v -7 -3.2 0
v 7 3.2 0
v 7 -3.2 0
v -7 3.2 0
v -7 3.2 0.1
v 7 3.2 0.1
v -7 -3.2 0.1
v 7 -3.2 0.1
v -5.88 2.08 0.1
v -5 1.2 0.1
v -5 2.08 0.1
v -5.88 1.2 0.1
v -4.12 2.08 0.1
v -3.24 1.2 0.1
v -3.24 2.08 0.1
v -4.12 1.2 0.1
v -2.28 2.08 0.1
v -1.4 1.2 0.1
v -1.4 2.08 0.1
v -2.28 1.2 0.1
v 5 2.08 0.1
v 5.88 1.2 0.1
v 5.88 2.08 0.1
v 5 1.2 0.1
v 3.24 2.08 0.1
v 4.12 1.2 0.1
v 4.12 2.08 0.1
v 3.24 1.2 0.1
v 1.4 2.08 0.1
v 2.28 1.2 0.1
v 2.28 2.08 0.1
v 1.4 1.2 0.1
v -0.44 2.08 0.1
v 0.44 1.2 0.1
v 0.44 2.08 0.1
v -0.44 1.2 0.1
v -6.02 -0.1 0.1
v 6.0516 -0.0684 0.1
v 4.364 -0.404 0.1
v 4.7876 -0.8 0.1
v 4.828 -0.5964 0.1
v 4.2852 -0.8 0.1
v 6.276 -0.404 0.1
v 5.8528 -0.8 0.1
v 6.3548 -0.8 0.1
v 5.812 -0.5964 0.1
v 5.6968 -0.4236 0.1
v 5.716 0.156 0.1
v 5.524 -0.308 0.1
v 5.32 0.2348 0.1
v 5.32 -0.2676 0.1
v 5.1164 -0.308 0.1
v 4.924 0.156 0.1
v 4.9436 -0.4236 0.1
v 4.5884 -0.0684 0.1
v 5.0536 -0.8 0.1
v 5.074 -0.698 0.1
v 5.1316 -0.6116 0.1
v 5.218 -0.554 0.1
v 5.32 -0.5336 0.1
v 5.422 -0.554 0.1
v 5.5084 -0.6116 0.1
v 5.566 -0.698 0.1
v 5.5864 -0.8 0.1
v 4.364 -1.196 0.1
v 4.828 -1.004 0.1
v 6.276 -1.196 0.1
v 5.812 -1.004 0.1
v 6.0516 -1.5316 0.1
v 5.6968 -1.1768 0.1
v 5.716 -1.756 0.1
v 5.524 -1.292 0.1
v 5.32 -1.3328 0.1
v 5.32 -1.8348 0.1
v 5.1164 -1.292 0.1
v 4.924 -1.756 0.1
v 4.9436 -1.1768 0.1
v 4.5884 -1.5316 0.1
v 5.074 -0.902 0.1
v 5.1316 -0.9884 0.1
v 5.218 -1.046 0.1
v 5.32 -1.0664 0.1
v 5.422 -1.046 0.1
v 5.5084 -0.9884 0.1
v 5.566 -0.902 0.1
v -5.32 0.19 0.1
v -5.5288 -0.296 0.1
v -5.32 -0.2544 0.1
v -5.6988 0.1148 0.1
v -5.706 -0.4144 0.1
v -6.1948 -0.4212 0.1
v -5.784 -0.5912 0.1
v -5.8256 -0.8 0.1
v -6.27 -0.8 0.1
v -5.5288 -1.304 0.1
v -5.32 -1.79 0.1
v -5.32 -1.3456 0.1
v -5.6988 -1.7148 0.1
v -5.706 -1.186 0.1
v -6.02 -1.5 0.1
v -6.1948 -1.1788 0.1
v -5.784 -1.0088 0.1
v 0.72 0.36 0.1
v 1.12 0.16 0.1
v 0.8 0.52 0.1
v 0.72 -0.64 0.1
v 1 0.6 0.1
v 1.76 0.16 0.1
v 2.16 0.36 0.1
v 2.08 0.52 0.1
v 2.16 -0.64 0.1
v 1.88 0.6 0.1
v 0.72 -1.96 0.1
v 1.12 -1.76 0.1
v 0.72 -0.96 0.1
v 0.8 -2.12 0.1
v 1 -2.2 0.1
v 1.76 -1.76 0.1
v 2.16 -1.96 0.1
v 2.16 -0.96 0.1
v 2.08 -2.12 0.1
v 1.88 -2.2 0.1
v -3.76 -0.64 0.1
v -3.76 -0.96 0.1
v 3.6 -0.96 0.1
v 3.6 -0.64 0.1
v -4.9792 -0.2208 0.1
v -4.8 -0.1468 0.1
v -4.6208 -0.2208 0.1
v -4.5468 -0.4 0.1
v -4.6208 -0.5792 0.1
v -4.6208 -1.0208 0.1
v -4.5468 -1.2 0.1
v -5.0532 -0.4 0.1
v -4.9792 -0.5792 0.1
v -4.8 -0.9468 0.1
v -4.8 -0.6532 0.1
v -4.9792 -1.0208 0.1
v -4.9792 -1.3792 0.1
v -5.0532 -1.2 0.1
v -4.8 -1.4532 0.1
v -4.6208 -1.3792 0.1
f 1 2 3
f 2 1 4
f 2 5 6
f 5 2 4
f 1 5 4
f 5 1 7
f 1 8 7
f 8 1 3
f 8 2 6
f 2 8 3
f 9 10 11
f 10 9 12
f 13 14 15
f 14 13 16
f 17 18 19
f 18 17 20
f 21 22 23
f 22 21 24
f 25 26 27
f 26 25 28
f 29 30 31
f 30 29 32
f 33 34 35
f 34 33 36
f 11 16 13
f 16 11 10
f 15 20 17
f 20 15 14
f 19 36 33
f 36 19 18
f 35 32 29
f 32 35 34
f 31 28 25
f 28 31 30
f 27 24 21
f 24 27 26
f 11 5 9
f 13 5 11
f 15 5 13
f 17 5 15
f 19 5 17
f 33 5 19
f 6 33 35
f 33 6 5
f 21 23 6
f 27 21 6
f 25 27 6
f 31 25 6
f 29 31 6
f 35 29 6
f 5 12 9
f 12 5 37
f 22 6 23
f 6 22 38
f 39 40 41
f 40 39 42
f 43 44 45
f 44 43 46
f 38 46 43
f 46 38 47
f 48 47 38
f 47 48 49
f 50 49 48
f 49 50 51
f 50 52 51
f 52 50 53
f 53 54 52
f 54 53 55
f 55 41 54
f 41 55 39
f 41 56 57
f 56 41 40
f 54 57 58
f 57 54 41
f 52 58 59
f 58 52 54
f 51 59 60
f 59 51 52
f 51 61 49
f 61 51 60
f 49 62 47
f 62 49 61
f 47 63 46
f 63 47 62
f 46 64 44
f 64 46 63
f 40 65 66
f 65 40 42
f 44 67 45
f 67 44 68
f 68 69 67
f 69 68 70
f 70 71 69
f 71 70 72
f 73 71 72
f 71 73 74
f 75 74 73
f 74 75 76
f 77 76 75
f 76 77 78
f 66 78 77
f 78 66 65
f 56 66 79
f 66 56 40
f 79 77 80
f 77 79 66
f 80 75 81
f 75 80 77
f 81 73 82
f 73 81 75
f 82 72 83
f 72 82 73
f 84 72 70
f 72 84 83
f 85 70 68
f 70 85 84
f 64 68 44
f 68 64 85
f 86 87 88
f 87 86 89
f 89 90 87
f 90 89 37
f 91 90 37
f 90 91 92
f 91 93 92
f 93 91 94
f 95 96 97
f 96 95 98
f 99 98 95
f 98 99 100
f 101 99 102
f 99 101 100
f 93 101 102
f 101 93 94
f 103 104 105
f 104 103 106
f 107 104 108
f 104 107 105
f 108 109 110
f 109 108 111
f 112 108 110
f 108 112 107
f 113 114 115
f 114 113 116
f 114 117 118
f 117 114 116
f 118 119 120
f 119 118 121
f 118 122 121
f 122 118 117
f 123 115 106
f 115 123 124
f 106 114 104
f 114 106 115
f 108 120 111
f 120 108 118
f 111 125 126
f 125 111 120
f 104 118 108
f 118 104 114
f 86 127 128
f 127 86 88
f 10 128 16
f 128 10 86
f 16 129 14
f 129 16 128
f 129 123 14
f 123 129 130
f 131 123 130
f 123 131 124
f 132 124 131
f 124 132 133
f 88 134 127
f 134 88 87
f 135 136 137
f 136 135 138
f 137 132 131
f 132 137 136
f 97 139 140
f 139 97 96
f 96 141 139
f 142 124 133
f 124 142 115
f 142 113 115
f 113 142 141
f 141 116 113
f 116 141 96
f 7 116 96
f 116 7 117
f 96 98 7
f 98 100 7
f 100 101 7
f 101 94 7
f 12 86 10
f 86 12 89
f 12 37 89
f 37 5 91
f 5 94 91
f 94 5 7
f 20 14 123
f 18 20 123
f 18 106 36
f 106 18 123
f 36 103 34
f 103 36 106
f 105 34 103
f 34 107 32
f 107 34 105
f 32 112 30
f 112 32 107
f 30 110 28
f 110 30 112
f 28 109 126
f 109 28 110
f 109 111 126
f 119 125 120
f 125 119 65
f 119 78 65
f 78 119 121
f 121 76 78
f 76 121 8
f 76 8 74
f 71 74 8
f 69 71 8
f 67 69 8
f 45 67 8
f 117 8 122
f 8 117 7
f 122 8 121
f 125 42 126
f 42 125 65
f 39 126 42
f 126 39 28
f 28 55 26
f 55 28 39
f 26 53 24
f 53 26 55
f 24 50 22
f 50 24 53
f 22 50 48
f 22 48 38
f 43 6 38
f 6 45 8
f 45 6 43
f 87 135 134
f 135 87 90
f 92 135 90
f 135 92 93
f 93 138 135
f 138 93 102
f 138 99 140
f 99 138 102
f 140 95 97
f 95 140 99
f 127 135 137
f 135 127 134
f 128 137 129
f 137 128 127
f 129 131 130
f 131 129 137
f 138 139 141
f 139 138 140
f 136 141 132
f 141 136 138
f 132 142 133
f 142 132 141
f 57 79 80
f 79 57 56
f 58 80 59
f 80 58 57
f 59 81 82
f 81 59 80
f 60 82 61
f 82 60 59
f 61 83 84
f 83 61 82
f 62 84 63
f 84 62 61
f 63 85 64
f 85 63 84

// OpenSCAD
// file: ../p/box5-12.scad
use <../lib.scad>
function ldraw_lib__box5_12() = [
// 0 Box with 5 Faces without Any Edges
// 0 Name: box5-12.dat
// 0 Author: Chris Dee [cwdee]
// 0 !LDRAW_ORG Primitive UPDATE 2009-02
// 0 !LICENSE Licensed under CC BY 2.0 and CC BY 4.0 : see CAreadme.txt
// 
// 0 BFC CERTIFY CCW
  [0,"BFC","CERTIFY"],
  [0,"BFC","CCW"],
// 
// 0 !HISTORY 2009-09-03 [PTadmin] Official Update 2009-02
// 
// 
// 4 16 1 1 1 1 1 -1 -1 1 -1 -1 1 1
  [4,16,1,1,1,1,1,-1,-1,1,-1,-1,1,1],
// 4 16 -1 0 1 1 0 1 1 1 1 -1 1 1
  [4,16,-1,0,1,1,0,1,1,1,1,-1,1,1],
// 4 16 -1 0 -1 -1 0 1 -1 1 1 -1 1 -1
  [4,16,-1,0,-1,-1,0,1,-1,1,1,-1,1,-1],
// 4 16 1 0 -1 -1 0 -1 -1 1 -1 1 1 -1
  [4,16,1,0,-1,-1,0,-1,-1,1,-1,1,1,-1],
// 4 16 1 0 1 1 0 -1 1 1 -1 1 1 1
  [4,16,1,0,1,1,0,-1,1,1,-1,1,1,1],
// 0
];
module ldraw_lib__box5_12(step=0, col=false, unit=2/5, alt=false, line=0.2, solid=!$preview)
    makepoly(ldraw_lib__box5_12(), step=step, col=col, unit=unit, alt=alt, line=line, solid=solid);
ldraw_lib__box5_12(line=0.2);
// main file
use <../lib.scad>
use <../p/box5-12.scad>
function ldraw_lib__6259759a() = [
// 0 Sticker  0.8 x  1.7 with Dark Turquoise and Magenta Buttons and Slider
// 0 Name: 6259759a.dat
// 0 Author: Evert-Jan Boer [ejboer]
// 0 !LDRAW_ORG Part UPDATE 2022-01
// 0 !LICENSE Licensed under CC BY 2.0 and CC BY 4.0 : see CAreadme.txt
// 
// 0 BFC CERTIFY CCW
  [0,"BFC","CERTIFY"],
  [0,"BFC","CCW"],
// 
// 0 !KEYWORDS Pop-Up Party Bus, Set 70828
// 
// 0 !HISTORY 2022-01-14 [PTadmin] Official Update 2022-01
// 
// 
// 1 16 0 -0.25 0 17.5 0 0 0 0.25 0 0 0 8 box5-12.dat
  [1,16,0,-0.25,0,17.5,0,0,0,0.25,0,0,0,8, ldraw_lib__box5_12()],
// 
// 4 3 -12.5 -0.25 5.2 -14.7 -0.25 5.2 -14.7 -0.25 3 -12.5 -0.25 3
  [4,3,-12.5,-0.25,5.2,-14.7,-0.25,5.2,-14.7,-0.25,3,-12.5,-0.25,3],
// 4 26 -8.1 -0.25 5.2 -10.3 -0.25 5.2 -10.3 -0.25 3 -8.1 -0.25 3
  [4,26,-8.1,-0.25,5.2,-10.3,-0.25,5.2,-10.3,-0.25,3,-8.1,-0.25,3],
// 4 3 -3.5 -0.25 5.2 -5.7 -0.25 5.2 -5.7 -0.25 3 -3.5 -0.25 3
  [4,3,-3.5,-0.25,5.2,-5.7,-0.25,5.2,-5.7,-0.25,3,-3.5,-0.25,3],
// 4 3 14.7 -0.25 3 14.7 -0.25 5.2 12.5 -0.25 5.2 12.5 -0.25 3
  [4,3,14.7,-0.25,3,14.7,-0.25,5.2,12.5,-0.25,5.2,12.5,-0.25,3],
// 4 26 10.3 -0.25 3 10.3 -0.25 5.2 8.1 -0.25 5.2 8.1 -0.25 3
  [4,26,10.3,-0.25,3,10.3,-0.25,5.2,8.1,-0.25,5.2,8.1,-0.25,3],
// 4 3 5.7 -0.25 3 5.7 -0.25 5.2 3.5 -0.25 5.2 3.5 -0.25 3
  [4,3,5.7,-0.25,3,5.7,-0.25,5.2,3.5,-0.25,5.2,3.5,-0.25,3],
// 4 26 1.1 -0.25 5.2 -1.1 -0.25 5.2 -1.1 -0.25 3 1.1 -0.25 3
  [4,26,1.1,-0.25,5.2,-1.1,-0.25,5.2,-1.1,-0.25,3,1.1,-0.25,3],
// 4 0 -10.3 -0.25 5.2 -12.5 -0.25 5.2 -12.5 -0.25 3 -10.3 -0.25 3
  [4,0,-10.3,-0.25,5.2,-12.5,-0.25,5.2,-12.5,-0.25,3,-10.3,-0.25,3],
// 4 0 -5.7 -0.25 5.2 -8.1 -0.25 5.2 -8.1 -0.25 3 -5.7 -0.25 3
  [4,0,-5.7,-0.25,5.2,-8.1,-0.25,5.2,-8.1,-0.25,3,-5.7,-0.25,3],
// 4 0 -1.1 -0.25 5.2 -3.5 -0.25 5.2 -3.5 -0.25 3 -1.1 -0.25 3
  [4,0,-1.1,-0.25,5.2,-3.5,-0.25,5.2,-3.5,-0.25,3,-1.1,-0.25,3],
// 4 0 3.5 -0.25 5.2 1.1 -0.25 5.2 1.1 -0.25 3 3.5 -0.25 3
  [4,0,3.5,-0.25,5.2,1.1,-0.25,5.2,1.1,-0.25,3,3.5,-0.25,3],
// 4 0 8.1 -0.25 5.2 5.7 -0.25 5.2 5.7 -0.25 3 8.1 -0.25 3
  [4,0,8.1,-0.25,5.2,5.7,-0.25,5.2,5.7,-0.25,3,8.1,-0.25,3],
// 4 0 12.5 -0.25 5.2 10.3 -0.25 5.2 10.3 -0.25 3 12.5 -0.25 3
  [4,0,12.5,-0.25,5.2,10.3,-0.25,5.2,10.3,-0.25,3,12.5,-0.25,3],
// 3 0 -12.5 -0.25 5.2 -17.5 -0.25 8 -14.7 -0.25 5.2
  [3,0,-12.5,-0.25,5.2,-17.5,-0.25,8,-14.7,-0.25,5.2],
// 3 0 -10.3 -0.25 5.2 -17.5 -0.25 8 -12.5 -0.25 5.2
  [3,0,-10.3,-0.25,5.2,-17.5,-0.25,8,-12.5,-0.25,5.2],
// 3 0 -8.1 -0.25 5.2 -17.5 -0.25 8 -10.3 -0.25 5.2
  [3,0,-8.1,-0.25,5.2,-17.5,-0.25,8,-10.3,-0.25,5.2],
// 3 0 -5.7 -0.25 5.2 -17.5 -0.25 8 -8.1 -0.25 5.2
  [3,0,-5.7,-0.25,5.2,-17.5,-0.25,8,-8.1,-0.25,5.2],
// 3 0 -3.5 -0.25 5.2 -17.5 -0.25 8 -5.7 -0.25 5.2
  [3,0,-3.5,-0.25,5.2,-17.5,-0.25,8,-5.7,-0.25,5.2],
// 3 0 -1.1 -0.25 5.2 -17.5 -0.25 8 -3.5 -0.25 5.2
  [3,0,-1.1,-0.25,5.2,-17.5,-0.25,8,-3.5,-0.25,5.2],
// 4 0 -17.5 -0.25 8 -1.1 -0.25 5.2 1.1 -0.25 5.2 17.5 -0.25 8
  [4,0,-17.5,-0.25,8,-1.1,-0.25,5.2,1.1,-0.25,5.2,17.5,-0.25,8],
// 3 0 12.5 -0.25 5.2 14.7 -0.25 5.2 17.5 -0.25 8
  [3,0,12.5,-0.25,5.2,14.7,-0.25,5.2,17.5,-0.25,8],
// 3 0 10.3 -0.25 5.2 12.5 -0.25 5.2 17.5 -0.25 8
  [3,0,10.3,-0.25,5.2,12.5,-0.25,5.2,17.5,-0.25,8],
// 3 0 8.1 -0.25 5.2 10.3 -0.25 5.2 17.5 -0.25 8
  [3,0,8.1,-0.25,5.2,10.3,-0.25,5.2,17.5,-0.25,8],
// 3 0 5.7 -0.25 5.2 8.1 -0.25 5.2 17.5 -0.25 8
  [3,0,5.7,-0.25,5.2,8.1,-0.25,5.2,17.5,-0.25,8],
// 3 0 3.5 -0.25 5.2 5.7 -0.25 5.2 17.5 -0.25 8
  [3,0,3.5,-0.25,5.2,5.7,-0.25,5.2,17.5,-0.25,8],
// 3 0 1.1 -0.25 5.2 3.5 -0.25 5.2 17.5 -0.25 8
  [3,0,1.1,-0.25,5.2,3.5,-0.25,5.2,17.5,-0.25,8],
// 4 0 -14.7 -0.25 3 -14.7 -0.25 5.2 -17.5 -0.25 8 -15.05 -0.25 -0.25
  [4,0,-14.7,-0.25,3,-14.7,-0.25,5.2,-17.5,-0.25,8,-15.05,-0.25,-0.25],
// 4 0 17.5 -0.25 8 14.7 -0.25 5.2 14.7 -0.25 3 15.129 -0.25 -0.171
  [4,0,17.5,-0.25,8,14.7,-0.25,5.2,14.7,-0.25,3,15.129,-0.25,-0.171],
// 4 15 11.969 -0.25 -2 12.07 -0.25 -1.491 10.91 -0.25 -1.01 10.713 -0.25 -2
  [4,15,11.969,-0.25,-2,12.07,-0.25,-1.491,10.91,-0.25,-1.01,10.713,-0.25,-2],
// 4 15 14.53 -0.25 -1.491 14.632 -0.25 -2 15.887 -0.25 -2 15.69 -0.25 -1.01
  [4,15,14.53,-0.25,-1.491,14.632,-0.25,-2,15.887,-0.25,-2,15.69,-0.25,-1.01],
// 4 15 14.242 -0.25 -1.059 14.53 -0.25 -1.491 15.69 -0.25 -1.01 15.129 -0.25 -0.171
  [4,15,14.242,-0.25,-1.059,14.53,-0.25,-1.491,15.69,-0.25,-1.01,15.129,-0.25,-0.171],
// 4 15 13.81 -0.25 -0.77 14.242 -0.25 -1.059 15.129 -0.25 -0.171 14.29 -0.25 0.39
  [4,15,13.81,-0.25,-0.77,14.242,-0.25,-1.059,15.129,-0.25,-0.171,14.29,-0.25,0.39],
// 4 15 13.3 -0.25 -0.669 13.81 -0.25 -0.77 14.29 -0.25 0.39 13.3 -0.25 0.587
  [4,15,13.3,-0.25,-0.669,13.81,-0.25,-0.77,14.29,-0.25,0.39,13.3,-0.25,0.587],
// 4 15 12.791 -0.25 -0.77 13.3 -0.25 -0.669 13.3 -0.25 0.587 12.31 -0.25 0.39
  [4,15,12.791,-0.25,-0.77,13.3,-0.25,-0.669,13.3,-0.25,0.587,12.31,-0.25,0.39],
// 4 15 12.359 -0.25 -1.059 12.791 -0.25 -0.77 12.31 -0.25 0.39 11.471 -0.25 -0.171
  [4,15,12.359,-0.25,-1.059,12.791,-0.25,-0.77,12.31,-0.25,0.39,11.471,-0.25,-0.171],
// 4 15 12.07 -0.25 -1.491 12.359 -0.25 -1.059 11.471 -0.25 -0.171 10.91 -0.25 -1.01
  [4,15,12.07,-0.25,-1.491,12.359,-0.25,-1.059,11.471,-0.25,-0.171,10.91,-0.25,-1.01],
// 4 0 12.07 -0.25 -1.491 11.969 -0.25 -2 12.634 -0.25 -2 12.685 -0.25 -1.745
  [4,0,12.07,-0.25,-1.491,11.969,-0.25,-2,12.634,-0.25,-2,12.685,-0.25,-1.745],
// 4 0 12.359 -0.25 -1.059 12.07 -0.25 -1.491 12.685 -0.25 -1.745 12.829 -0.25 -1.529
  [4,0,12.359,-0.25,-1.059,12.07,-0.25,-1.491,12.685,-0.25,-1.745,12.829,-0.25,-1.529],
// 4 0 12.791 -0.25 -0.77 12.359 -0.25 -1.059 12.829 -0.25 -1.529 13.045 -0.25 -1.385
  [4,0,12.791,-0.25,-0.77,12.359,-0.25,-1.059,12.829,-0.25,-1.529,13.045,-0.25,-1.385],
// 4 0 13.3 -0.25 -0.669 12.791 -0.25 -0.77 13.045 -0.25 -1.385 13.3 -0.25 -1.334
  [4,0,13.3,-0.25,-0.669,12.791,-0.25,-0.77,13.045,-0.25,-1.385,13.3,-0.25,-1.334],
// 4 0 13.81 -0.25 -0.77 13.3 -0.25 -0.669 13.3 -0.25 -1.334 13.555 -0.25 -1.385
  [4,0,13.81,-0.25,-0.77,13.3,-0.25,-0.669,13.3,-0.25,-1.334,13.555,-0.25,-1.385],
// 4 0 14.242 -0.25 -1.059 13.81 -0.25 -0.77 13.555 -0.25 -1.385 13.771 -0.25 -1.529
  [4,0,14.242,-0.25,-1.059,13.81,-0.25,-0.77,13.555,-0.25,-1.385,13.771,-0.25,-1.529],
// 4 0 14.53 -0.25 -1.491 14.242 -0.25 -1.059 13.771 -0.25 -1.529 13.915 -0.25 -1.745
  [4,0,14.53,-0.25,-1.491,14.242,-0.25,-1.059,13.771,-0.25,-1.529,13.915,-0.25,-1.745],
// 4 0 14.632 -0.25 -2 14.53 -0.25 -1.491 13.915 -0.25 -1.745 13.966 -0.25 -2
  [4,0,14.632,-0.25,-2,14.53,-0.25,-1.491,13.915,-0.25,-1.745,13.966,-0.25,-2],
// 4 15 10.91 -0.25 -2.99 12.07 -0.25 -2.51 11.969 -0.25 -2 10.713 -0.25 -2
  [4,15,10.91,-0.25,-2.99,12.07,-0.25,-2.51,11.969,-0.25,-2,10.713,-0.25,-2],
// 4 15 15.887 -0.25 -2 14.632 -0.25 -2 14.53 -0.25 -2.51 15.69 -0.25 -2.99
  [4,15,15.887,-0.25,-2,14.632,-0.25,-2,14.53,-0.25,-2.51,15.69,-0.25,-2.99],
// 4 15 15.69 -0.25 -2.99 14.53 -0.25 -2.51 14.242 -0.25 -2.942 15.129 -0.25 -3.829
  [4,15,15.69,-0.25,-2.99,14.53,-0.25,-2.51,14.242,-0.25,-2.942,15.129,-0.25,-3.829],
// 4 15 15.129 -0.25 -3.829 14.242 -0.25 -2.942 13.81 -0.25 -3.23 14.29 -0.25 -4.39
  [4,15,15.129,-0.25,-3.829,14.242,-0.25,-2.942,13.81,-0.25,-3.23,14.29,-0.25,-4.39],
// 4 15 14.29 -0.25 -4.39 13.81 -0.25 -3.23 13.3 -0.25 -3.332 13.3 -0.25 -4.587
  [4,15,14.29,-0.25,-4.39,13.81,-0.25,-3.23,13.3,-0.25,-3.332,13.3,-0.25,-4.587],
// 4 15 13.3 -0.25 -4.587 13.3 -0.25 -3.332 12.791 -0.25 -3.23 12.31 -0.25 -4.39
  [4,15,13.3,-0.25,-4.587,13.3,-0.25,-3.332,12.791,-0.25,-3.23,12.31,-0.25,-4.39],
// 4 15 12.31 -0.25 -4.39 12.791 -0.25 -3.23 12.359 -0.25 -2.942 11.471 -0.25 -3.829
  [4,15,12.31,-0.25,-4.39,12.791,-0.25,-3.23,12.359,-0.25,-2.942,11.471,-0.25,-3.829],
// 4 15 11.471 -0.25 -3.829 12.359 -0.25 -2.942 12.07 -0.25 -2.51 10.91 -0.25 -2.99
  [4,15,11.471,-0.25,-3.829,12.359,-0.25,-2.942,12.07,-0.25,-2.51,10.91,-0.25,-2.99],
// 4 0 12.634 -0.25 -2 11.969 -0.25 -2 12.07 -0.25 -2.51 12.685 -0.25 -2.255
  [4,0,12.634,-0.25,-2,11.969,-0.25,-2,12.07,-0.25,-2.51,12.685,-0.25,-2.255],
// 4 0 12.685 -0.25 -2.255 12.07 -0.25 -2.51 12.359 -0.25 -2.942 12.829 -0.25 -2.471
  [4,0,12.685,-0.25,-2.255,12.07,-0.25,-2.51,12.359,-0.25,-2.942,12.829,-0.25,-2.471],
// 4 0 12.829 -0.25 -2.471 12.359 -0.25 -2.942 12.791 -0.25 -3.23 13.045 -0.25 -2.615
  [4,0,12.829,-0.25,-2.471,12.359,-0.25,-2.942,12.791,-0.25,-3.23,13.045,-0.25,-2.615],
// 4 0 13.045 -0.25 -2.615 12.791 -0.25 -3.23 13.3 -0.25 -3.332 13.3 -0.25 -2.666
  [4,0,13.045,-0.25,-2.615,12.791,-0.25,-3.23,13.3,-0.25,-3.332,13.3,-0.25,-2.666],
// 4 0 13.3 -0.25 -2.666 13.3 -0.25 -3.332 13.81 -0.25 -3.23 13.555 -0.25 -2.615
  [4,0,13.3,-0.25,-2.666,13.3,-0.25,-3.332,13.81,-0.25,-3.23,13.555,-0.25,-2.615],
// 4 0 13.555 -0.25 -2.615 13.81 -0.25 -3.23 14.242 -0.25 -2.942 13.771 -0.25 -2.471
  [4,0,13.555,-0.25,-2.615,13.81,-0.25,-3.23,14.242,-0.25,-2.942,13.771,-0.25,-2.471],
// 4 0 13.771 -0.25 -2.471 14.242 -0.25 -2.942 14.53 -0.25 -2.51 13.915 -0.25 -2.255
  [4,0,13.771,-0.25,-2.471,14.242,-0.25,-2.942,14.53,-0.25,-2.51,13.915,-0.25,-2.255],
// 4 0 13.915 -0.25 -2.255 14.53 -0.25 -2.51 14.632 -0.25 -2 13.966 -0.25 -2
  [4,0,13.915,-0.25,-2.255,14.53,-0.25,-2.51,14.632,-0.25,-2,13.966,-0.25,-2],
// 4 15 -14.247 -0.25 0.287 -13.822 -0.25 -0.74 -13.3 -0.25 -0.636 -13.3 -0.25 0.475
  [4,15,-14.247,-0.25,0.287,-13.822,-0.25,-0.74,-13.3,-0.25,-0.636,-13.3,-0.25,0.475],
// 4 15 -14.247 -0.25 0.287 -15.05 -0.25 -0.25 -14.265 -0.25 -1.036 -13.822 -0.25 -0.74
  [4,15,-14.247,-0.25,0.287,-15.05,-0.25,-0.25,-14.265,-0.25,-1.036,-13.822,-0.25,-0.74],
// 4 15 -15.487 -0.25 -1.053 -14.46 -0.25 -1.478 -14.265 -0.25 -1.036 -15.05 -0.25 -0.25
  [4,15,-15.487,-0.25,-1.053,-14.46,-0.25,-1.478,-14.265,-0.25,-1.036,-15.05,-0.25,-0.25],
// 4 15 -15.487 -0.25 -1.053 -15.675 -0.25 -2 -14.564 -0.25 -2 -14.46 -0.25 -1.478
  [4,15,-15.487,-0.25,-1.053,-15.675,-0.25,-2,-14.564,-0.25,-2,-14.46,-0.25,-1.478],
// 4 15 -13.3 -0.25 -3.364 -13.822 -0.25 -3.26 -14.247 -0.25 -4.287 -13.3 -0.25 -4.475
  [4,15,-13.3,-0.25,-3.364,-13.822,-0.25,-3.26,-14.247,-0.25,-4.287,-13.3,-0.25,-4.475],
// 4 15 -14.265 -0.25 -2.965 -15.05 -0.25 -3.75 -14.247 -0.25 -4.287 -13.822 -0.25 -3.26
  [4,15,-14.265,-0.25,-2.965,-15.05,-0.25,-3.75,-14.247,-0.25,-4.287,-13.822,-0.25,-3.26],
// 4 15 -14.265 -0.25 -2.965 -14.46 -0.25 -2.522 -15.487 -0.25 -2.947 -15.05 -0.25 -3.75
  [4,15,-14.265,-0.25,-2.965,-14.46,-0.25,-2.522,-15.487,-0.25,-2.947,-15.05,-0.25,-3.75],
// 4 15 -14.564 -0.25 -2 -15.675 -0.25 -2 -15.487 -0.25 -2.947 -14.46 -0.25 -2.522
  [4,15,-14.564,-0.25,-2,-15.675,-0.25,-2,-15.487,-0.25,-2.947,-14.46,-0.25,-2.522],
// 4 15 1.8 -0.25 0.9 1.8 -0.25 -1.6 2.8 -0.25 0.4 2 -0.25 1.3
  [4,15,1.8,-0.25,0.9,1.8,-0.25,-1.6,2.8,-0.25,0.4,2,-0.25,1.3],
// 4 15 2.5 -0.25 1.5 2 -0.25 1.3 2.8 -0.25 0.4 4.4 -0.25 0.4
  [4,15,2.5,-0.25,1.5,2,-0.25,1.3,2.8,-0.25,0.4,4.4,-0.25,0.4],
// 4 15 4.4 -0.25 0.4 5.4 -0.25 -1.6 5.4 -0.25 0.9 5.2 -0.25 1.3
  [4,15,4.4,-0.25,0.4,5.4,-0.25,-1.6,5.4,-0.25,0.9,5.2,-0.25,1.3],
// 4 15 4.4 -0.25 0.4 5.2 -0.25 1.3 4.7 -0.25 1.5 2.5 -0.25 1.5
  [4,15,4.4,-0.25,0.4,5.2,-0.25,1.3,4.7,-0.25,1.5,2.5,-0.25,1.5],
// 4 15 2.8 -0.25 -4.4 1.8 -0.25 -2.4 1.8 -0.25 -4.9 2 -0.25 -5.3
  [4,15,2.8,-0.25,-4.4,1.8,-0.25,-2.4,1.8,-0.25,-4.9,2,-0.25,-5.3],
// 4 15 2.8 -0.25 -4.4 2 -0.25 -5.3 2.5 -0.25 -5.5 4.4 -0.25 -4.4
  [4,15,2.8,-0.25,-4.4,2,-0.25,-5.3,2.5,-0.25,-5.5,4.4,-0.25,-4.4],
// 4 15 5.4 -0.25 -4.9 5.4 -0.25 -2.4 4.4 -0.25 -4.4 5.2 -0.25 -5.3
  [4,15,5.4,-0.25,-4.9,5.4,-0.25,-2.4,4.4,-0.25,-4.4,5.2,-0.25,-5.3],
// 4 15 4.7 -0.25 -5.5 5.2 -0.25 -5.3 4.4 -0.25 -4.4 2.5 -0.25 -5.5
  [4,15,4.7,-0.25,-5.5,5.2,-0.25,-5.3,4.4,-0.25,-4.4,2.5,-0.25,-5.5],
// 4 15 1.8 -0.25 -1.6 -9.4 -0.25 -1.6 -9.4 -0.25 -2.4 1.8 -0.25 -2.4
  [4,15,1.8,-0.25,-1.6,-9.4,-0.25,-1.6,-9.4,-0.25,-2.4,1.8,-0.25,-2.4],
// 4 15 1.8 -0.25 -1.6 1.8 -0.25 -2.4 2.8 -0.25 -4.4 2.8 -0.25 0.4
  [4,15,1.8,-0.25,-1.6,1.8,-0.25,-2.4,2.8,-0.25,-4.4,2.8,-0.25,0.4],
// 4 15 4.4 -0.25 0.4 4.4 -0.25 -4.4 5.4 -0.25 -2.4 5.4 -0.25 -1.6
  [4,15,4.4,-0.25,0.4,4.4,-0.25,-4.4,5.4,-0.25,-2.4,5.4,-0.25,-1.6],
// 4 15 9 -0.25 -1.6 5.4 -0.25 -1.6 5.4 -0.25 -2.4 9 -0.25 -2.4
  [4,15,9,-0.25,-1.6,5.4,-0.25,-1.6,5.4,-0.25,-2.4,9,-0.25,-2.4],
// 4 26 4.4 -0.25 0.4 2.8 -0.25 0.4 2.8 -0.25 -4.4 4.4 -0.25 -4.4
  [4,26,4.4,-0.25,0.4,2.8,-0.25,0.4,2.8,-0.25,-4.4,4.4,-0.25,-4.4],
// 4 0 -13.3 -0.25 0.475 -13.3 -0.25 -0.636 -12.448 -0.25 -0.552 -12 -0.25 -0.367
  [4,0,-13.3,-0.25,0.475,-13.3,-0.25,-0.636,-12.448,-0.25,-0.552,-12,-0.25,-0.367],
// 4 0 -12.5 -0.25 3 -13.3 -0.25 0.475 -12 -0.25 -0.367 -10.3 -0.25 3
  [4,0,-12.5,-0.25,3,-13.3,-0.25,0.475,-12,-0.25,-0.367,-10.3,-0.25,3],
// 4 0 -10.3 -0.25 3 -12 -0.25 -0.367 -11.552 -0.25 -0.552 -8.1 -0.25 3
  [4,0,-10.3,-0.25,3,-12,-0.25,-0.367,-11.552,-0.25,-0.552,-8.1,-0.25,3],
// 4 0 -8.1 -0.25 3 -11.552 -0.25 -0.552 -11.367 -0.25 -1 -9.4 -0.25 -1.6
  [4,0,-8.1,-0.25,3,-11.552,-0.25,-0.552,-11.367,-0.25,-1,-9.4,-0.25,-1.6],
// 4 0 -9.4 -0.25 -1.6 -11.367 -0.25 -1 -11.552 -0.25 -1.448 -9.4 -0.25 -2.4
  [4,0,-9.4,-0.25,-1.6,-11.367,-0.25,-1,-11.552,-0.25,-1.448,-9.4,-0.25,-2.4],
// 4 0 -9.4 -0.25 -2.4 -11.552 -0.25 -1.448 -11.552 -0.25 -2.552 -11.367 -0.25 -3
  [4,0,-9.4,-0.25,-2.4,-11.552,-0.25,-1.448,-11.552,-0.25,-2.552,-11.367,-0.25,-3],
// 4 0 -12.633 -0.25 -1 -12.448 -0.25 -0.552 -13.3 -0.25 -0.636 -13.822 -0.25 -0.74
  [4,0,-12.633,-0.25,-1,-12.448,-0.25,-0.552,-13.3,-0.25,-0.636,-13.822,-0.25,-0.74],
// 4 0 -12 -0.25 -1.633 -12.448 -0.25 -1.448 -12.448 -0.25 -2.552 -12 -0.25 -2.367
  [4,0,-12,-0.25,-1.633,-12.448,-0.25,-1.448,-12.448,-0.25,-2.552,-12,-0.25,-2.367],
// 4 0 -11.552 -0.25 -1.448 -12 -0.25 -1.633 -12 -0.25 -2.367 -11.552 -0.25 -2.552
  [4,0,-11.552,-0.25,-1.448,-12,-0.25,-1.633,-12,-0.25,-2.367,-11.552,-0.25,-2.552],
// 4 0 -12.448 -0.25 -3.448 -12.633 -0.25 -3 -13.3 -0.25 -3.364 -13.3 -0.25 -4.475
  [4,0,-12.448,-0.25,-3.448,-12.633,-0.25,-3,-13.3,-0.25,-3.364,-13.3,-0.25,-4.475],
// 3 0 -13.3 -0.25 -4.475 -12 -0.25 -3.633 -12.448 -0.25 -3.448
  [3,0,-13.3,-0.25,-4.475,-12,-0.25,-3.633,-12.448,-0.25,-3.448],
// 4 0 -9.4 -0.25 -2.4 -11.367 -0.25 -3 -11.552 -0.25 -3.448 1.8 -0.25 -2.4
  [4,0,-9.4,-0.25,-2.4,-11.367,-0.25,-3,-11.552,-0.25,-3.448,1.8,-0.25,-2.4],
// 4 0 1.8 -0.25 -4.9 1.8 -0.25 -2.4 -11.552 -0.25 -3.448 -12 -0.25 -3.633
  [4,0,1.8,-0.25,-4.9,1.8,-0.25,-2.4,-11.552,-0.25,-3.448,-12,-0.25,-3.633],
// 4 0 2 -0.25 -5.3 1.8 -0.25 -4.9 -12 -0.25 -3.633 -13.3 -0.25 -4.475
  [4,0,2,-0.25,-5.3,1.8,-0.25,-4.9,-12,-0.25,-3.633,-13.3,-0.25,-4.475],
// 4 0 2 -0.25 -5.3 -13.3 -0.25 -4.475 -17.5 -0.25 -8 2.5 -0.25 -5.5
  [4,0,2,-0.25,-5.3,-13.3,-0.25,-4.475,-17.5,-0.25,-8,2.5,-0.25,-5.5],
// 3 0 -13.3 -0.25 -4.475 -14.247 -0.25 -4.287 -17.5 -0.25 -8
  [3,0,-13.3,-0.25,-4.475,-14.247,-0.25,-4.287,-17.5,-0.25,-8],
// 3 0 -14.247 -0.25 -4.287 -15.05 -0.25 -3.75 -17.5 -0.25 -8
  [3,0,-14.247,-0.25,-4.287,-15.05,-0.25,-3.75,-17.5,-0.25,-8],
// 3 0 -15.05 -0.25 -3.75 -15.487 -0.25 -2.947 -17.5 -0.25 -8
  [3,0,-15.05,-0.25,-3.75,-15.487,-0.25,-2.947,-17.5,-0.25,-8],
// 3 0 -15.487 -0.25 -2.947 -15.675 -0.25 -2 -17.5 -0.25 -8
  [3,0,-15.487,-0.25,-2.947,-15.675,-0.25,-2,-17.5,-0.25,-8],
// 4 0 -14.7 -0.25 3 -14.247 -0.25 0.287 -13.3 -0.25 0.475 -12.5 -0.25 3
  [4,0,-14.7,-0.25,3,-14.247,-0.25,0.287,-13.3,-0.25,0.475,-12.5,-0.25,3],
// 3 0 -14.7 -0.25 3 -15.05 -0.25 -0.25 -14.247 -0.25 0.287
  [3,0,-14.7,-0.25,3,-15.05,-0.25,-0.25,-14.247,-0.25,0.287],
// 3 0 -15.05 -0.25 -0.25 -17.5 -0.25 8 -15.487 -0.25 -1.053
  [3,0,-15.05,-0.25,-0.25,-17.5,-0.25,8,-15.487,-0.25,-1.053],
// 4 0 -15.675 -0.25 -2 -15.487 -0.25 -1.053 -17.5 -0.25 8 -17.5 -0.25 -8
  [4,0,-15.675,-0.25,-2,-15.487,-0.25,-1.053,-17.5,-0.25,8,-17.5,-0.25,-8],
// 3 0 -5.7 -0.25 3 -8.1 -0.25 3 -9.4 -0.25 -1.6
  [3,0,-5.7,-0.25,3,-8.1,-0.25,3,-9.4,-0.25,-1.6],
// 3 0 -3.5 -0.25 3 -5.7 -0.25 3 -9.4 -0.25 -1.6
  [3,0,-3.5,-0.25,3,-5.7,-0.25,3,-9.4,-0.25,-1.6],
// 4 0 -1.1 -0.25 3 -3.5 -0.25 3 -9.4 -0.25 -1.6 1.8 -0.25 -1.6
  [4,0,-1.1,-0.25,3,-3.5,-0.25,3,-9.4,-0.25,-1.6,1.8,-0.25,-1.6],
// 4 0 -1.1 -0.25 3 1.8 -0.25 -1.6 1.8 -0.25 0.9 1.1 -0.25 3
  [4,0,-1.1,-0.25,3,1.8,-0.25,-1.6,1.8,-0.25,0.9,1.1,-0.25,3],
// 3 0 2 -0.25 1.3 1.1 -0.25 3 1.8 -0.25 0.9
  [3,0,2,-0.25,1.3,1.1,-0.25,3,1.8,-0.25,0.9],
// 4 0 1.1 -0.25 3 2 -0.25 1.3 2.5 -0.25 1.5 3.5 -0.25 3
  [4,0,1.1,-0.25,3,2,-0.25,1.3,2.5,-0.25,1.5,3.5,-0.25,3],
// 4 0 3.5 -0.25 3 2.5 -0.25 1.5 4.7 -0.25 1.5 5.7 -0.25 3
  [4,0,3.5,-0.25,3,2.5,-0.25,1.5,4.7,-0.25,1.5,5.7,-0.25,3],
// 4 0 5.7 -0.25 3 4.7 -0.25 1.5 5.2 -0.25 1.3 8.1 -0.25 3
  [4,0,5.7,-0.25,3,4.7,-0.25,1.5,5.2,-0.25,1.3,8.1,-0.25,3],
// 4 0 8.1 -0.25 3 5.2 -0.25 1.3 5.4 -0.25 0.9 9 -0.25 -1.6
  [4,0,8.1,-0.25,3,5.2,-0.25,1.3,5.4,-0.25,0.9,9,-0.25,-1.6],
// 3 0 5.4 -0.25 0.9 5.4 -0.25 -1.6 9 -0.25 -1.6
  [3,0,5.4,-0.25,0.9,5.4,-0.25,-1.6,9,-0.25,-1.6],
// 4 0 9 -0.25 -2.4 5.4 -0.25 -2.4 5.4 -0.25 -4.9 10.91 -0.25 -2.99
  [4,0,9,-0.25,-2.4,5.4,-0.25,-2.4,5.4,-0.25,-4.9,10.91,-0.25,-2.99],
// 4 0 11.471 -0.25 -3.829 10.91 -0.25 -2.99 5.4 -0.25 -4.9 5.2 -0.25 -5.3
  [4,0,11.471,-0.25,-3.829,10.91,-0.25,-2.99,5.4,-0.25,-4.9,5.2,-0.25,-5.3],
// 4 0 12.31 -0.25 -4.39 11.471 -0.25 -3.829 5.2 -0.25 -5.3 17.5 -0.25 -8
  [4,0,12.31,-0.25,-4.39,11.471,-0.25,-3.829,5.2,-0.25,-5.3,17.5,-0.25,-8],
// 3 0 12.31 -0.25 -4.39 17.5 -0.25 -8 13.3 -0.25 -4.587
  [3,0,12.31,-0.25,-4.39,17.5,-0.25,-8,13.3,-0.25,-4.587],
// 3 0 14.29 -0.25 -4.39 13.3 -0.25 -4.587 17.5 -0.25 -8
  [3,0,14.29,-0.25,-4.39,13.3,-0.25,-4.587,17.5,-0.25,-8],
// 3 0 15.129 -0.25 -3.829 14.29 -0.25 -4.39 17.5 -0.25 -8
  [3,0,15.129,-0.25,-3.829,14.29,-0.25,-4.39,17.5,-0.25,-8],
// 3 0 15.69 -0.25 -2.99 15.129 -0.25 -3.829 17.5 -0.25 -8
  [3,0,15.69,-0.25,-2.99,15.129,-0.25,-3.829,17.5,-0.25,-8],
// 3 0 15.887 -0.25 -2 15.69 -0.25 -2.99 17.5 -0.25 -8
  [3,0,15.887,-0.25,-2,15.69,-0.25,-2.99,17.5,-0.25,-8],
// 4 0 4.7 -0.25 -5.5 2.5 -0.25 -5.5 -17.5 -0.25 -8 17.5 -0.25 -8
  [4,0,4.7,-0.25,-5.5,2.5,-0.25,-5.5,-17.5,-0.25,-8,17.5,-0.25,-8],
// 3 0 4.7 -0.25 -5.5 17.5 -0.25 -8 5.2 -0.25 -5.3
  [3,0,4.7,-0.25,-5.5,17.5,-0.25,-8,5.2,-0.25,-5.3],
// 4 0 10.713 -0.25 -2 9 -0.25 -1.6 9 -0.25 -2.4 10.91 -0.25 -2.99
  [4,0,10.713,-0.25,-2,9,-0.25,-1.6,9,-0.25,-2.4,10.91,-0.25,-2.99],
// 4 0 9 -0.25 -1.6 10.713 -0.25 -2 10.91 -0.25 -1.01 8.1 -0.25 3
  [4,0,9,-0.25,-1.6,10.713,-0.25,-2,10.91,-0.25,-1.01,8.1,-0.25,3],
// 4 0 10.3 -0.25 3 8.1 -0.25 3 10.91 -0.25 -1.01 11.471 -0.25 -0.171
  [4,0,10.3,-0.25,3,8.1,-0.25,3,10.91,-0.25,-1.01,11.471,-0.25,-0.171],
// 4 0 10.3 -0.25 3 11.471 -0.25 -0.171 12.31 -0.25 0.39 12.5 -0.25 3
  [4,0,10.3,-0.25,3,11.471,-0.25,-0.171,12.31,-0.25,0.39,12.5,-0.25,3],
// 4 0 12.5 -0.25 3 12.31 -0.25 0.39 13.3 -0.25 0.587 14.7 -0.25 3
  [4,0,12.5,-0.25,3,12.31,-0.25,0.39,13.3,-0.25,0.587,14.7,-0.25,3],
// 3 0 14.7 -0.25 3 13.3 -0.25 0.587 14.29 -0.25 0.39
  [3,0,14.7,-0.25,3,13.3,-0.25,0.587,14.29,-0.25,0.39],
// 3 0 14.7 -0.25 3 14.29 -0.25 0.39 15.129 -0.25 -0.171
  [3,0,14.7,-0.25,3,14.29,-0.25,0.39,15.129,-0.25,-0.171],
// 3 0 15.69 -0.25 -1.01 17.5 -0.25 8 15.129 -0.25 -0.171
  [3,0,15.69,-0.25,-1.01,17.5,-0.25,8,15.129,-0.25,-0.171],
// 4 0 17.5 -0.25 8 15.69 -0.25 -1.01 15.887 -0.25 -2 17.5 -0.25 -8
  [4,0,17.5,-0.25,8,15.69,-0.25,-1.01,15.887,-0.25,-2,17.5,-0.25,-8],
// 4 0 -12.633 -0.25 -1 -13.822 -0.25 -0.74 -14.265 -0.25 -1.036 -12.448 -0.25 -1.448
  [4,0,-12.633,-0.25,-1,-13.822,-0.25,-0.74,-14.265,-0.25,-1.036,-12.448,-0.25,-1.448],
// 4 0 -12.448 -0.25 -1.448 -14.265 -0.25 -1.036 -14.46 -0.25 -1.478 -14.564 -0.25 -2
  [4,0,-12.448,-0.25,-1.448,-14.265,-0.25,-1.036,-14.46,-0.25,-1.478,-14.564,-0.25,-2],
// 4 0 -12.448 -0.25 -2.552 -12.448 -0.25 -1.448 -14.564 -0.25 -2 -14.46 -0.25 -2.522
  [4,0,-12.448,-0.25,-2.552,-12.448,-0.25,-1.448,-14.564,-0.25,-2,-14.46,-0.25,-2.522],
// 4 0 -12.448 -0.25 -2.552 -14.46 -0.25 -2.522 -14.265 -0.25 -2.965 -12.633 -0.25 -3
  [4,0,-12.448,-0.25,-2.552,-14.46,-0.25,-2.522,-14.265,-0.25,-2.965,-12.633,-0.25,-3],
// 4 0 -12.633 -0.25 -3 -14.265 -0.25 -2.965 -13.822 -0.25 -3.26 -13.3 -0.25 -3.364
  [4,0,-12.633,-0.25,-3,-14.265,-0.25,-2.965,-13.822,-0.25,-3.26,-13.3,-0.25,-3.364],
// 4 15 -12.448 -0.25 -0.552 -12.633 -0.25 -1 -12.448 -0.25 -1.448 -12 -0.25 -1.633
  [4,15,-12.448,-0.25,-0.552,-12.633,-0.25,-1,-12.448,-0.25,-1.448,-12,-0.25,-1.633],
// 4 15 -12 -0.25 -0.367 -12.448 -0.25 -0.552 -12 -0.25 -1.633 -11.552 -0.25 -0.552
  [4,15,-12,-0.25,-0.367,-12.448,-0.25,-0.552,-12,-0.25,-1.633,-11.552,-0.25,-0.552],
// 4 15 -11.552 -0.25 -0.552 -12 -0.25 -1.633 -11.552 -0.25 -1.448 -11.367 -0.25 -1
  [4,15,-11.552,-0.25,-0.552,-12,-0.25,-1.633,-11.552,-0.25,-1.448,-11.367,-0.25,-1],
// 4 15 -12.448 -0.25 -2.552 -12.633 -0.25 -3 -12.448 -0.25 -3.448 -12 -0.25 -3.633
  [4,15,-12.448,-0.25,-2.552,-12.633,-0.25,-3,-12.448,-0.25,-3.448,-12,-0.25,-3.633],
// 4 15 -12 -0.25 -2.367 -12.448 -0.25 -2.552 -12 -0.25 -3.633 -11.552 -0.25 -2.552
  [4,15,-12,-0.25,-2.367,-12.448,-0.25,-2.552,-12,-0.25,-3.633,-11.552,-0.25,-2.552],
// 4 15 -11.552 -0.25 -2.552 -12 -0.25 -3.633 -11.552 -0.25 -3.448 -11.367 -0.25 -3
  [4,15,-11.552,-0.25,-2.552,-12,-0.25,-3.633,-11.552,-0.25,-3.448,-11.367,-0.25,-3],
// 4 15 12.685 -0.25 -1.745 12.634 -0.25 -2 12.685 -0.25 -2.255 12.829 -0.25 -2.471
  [4,15,12.685,-0.25,-1.745,12.634,-0.25,-2,12.685,-0.25,-2.255,12.829,-0.25,-2.471],
// 4 15 12.829 -0.25 -1.529 12.685 -0.25 -1.745 12.829 -0.25 -2.471 13.045 -0.25 -1.385
  [4,15,12.829,-0.25,-1.529,12.685,-0.25,-1.745,12.829,-0.25,-2.471,13.045,-0.25,-1.385],
// 4 15 13.045 -0.25 -1.385 12.829 -0.25 -2.471 13.045 -0.25 -2.615 13.3 -0.25 -2.666
  [4,15,13.045,-0.25,-1.385,12.829,-0.25,-2.471,13.045,-0.25,-2.615,13.3,-0.25,-2.666],
// 4 15 13.3 -0.25 -1.334 13.045 -0.25 -1.385 13.3 -0.25 -2.666 13.555 -0.25 -1.385
  [4,15,13.3,-0.25,-1.334,13.045,-0.25,-1.385,13.3,-0.25,-2.666,13.555,-0.25,-1.385],
// 4 15 13.555 -0.25 -1.385 13.3 -0.25 -2.666 13.555 -0.25 -2.615 13.771 -0.25 -2.471
  [4,15,13.555,-0.25,-1.385,13.3,-0.25,-2.666,13.555,-0.25,-2.615,13.771,-0.25,-2.471],
// 4 15 13.771 -0.25 -1.529 13.555 -0.25 -1.385 13.771 -0.25 -2.471 13.915 -0.25 -1.745
  [4,15,13.771,-0.25,-1.529,13.555,-0.25,-1.385,13.771,-0.25,-2.471,13.915,-0.25,-1.745],
// 4 15 13.915 -0.25 -1.745 13.771 -0.25 -2.471 13.915 -0.25 -2.255 13.966 -0.25 -2
  [4,15,13.915,-0.25,-1.745,13.771,-0.25,-2.471,13.915,-0.25,-2.255,13.966,-0.25,-2],
];
module ldraw_lib__6259759a(step=0, col=false, unit=2/5, alt=false, line=0.2, solid=!$preview)
    makepoly(ldraw_lib__6259759a(), step=step, col=col, unit=unit, alt=alt, line=line, solid=solid);
ldraw_lib__6259759a(line=0.2);
